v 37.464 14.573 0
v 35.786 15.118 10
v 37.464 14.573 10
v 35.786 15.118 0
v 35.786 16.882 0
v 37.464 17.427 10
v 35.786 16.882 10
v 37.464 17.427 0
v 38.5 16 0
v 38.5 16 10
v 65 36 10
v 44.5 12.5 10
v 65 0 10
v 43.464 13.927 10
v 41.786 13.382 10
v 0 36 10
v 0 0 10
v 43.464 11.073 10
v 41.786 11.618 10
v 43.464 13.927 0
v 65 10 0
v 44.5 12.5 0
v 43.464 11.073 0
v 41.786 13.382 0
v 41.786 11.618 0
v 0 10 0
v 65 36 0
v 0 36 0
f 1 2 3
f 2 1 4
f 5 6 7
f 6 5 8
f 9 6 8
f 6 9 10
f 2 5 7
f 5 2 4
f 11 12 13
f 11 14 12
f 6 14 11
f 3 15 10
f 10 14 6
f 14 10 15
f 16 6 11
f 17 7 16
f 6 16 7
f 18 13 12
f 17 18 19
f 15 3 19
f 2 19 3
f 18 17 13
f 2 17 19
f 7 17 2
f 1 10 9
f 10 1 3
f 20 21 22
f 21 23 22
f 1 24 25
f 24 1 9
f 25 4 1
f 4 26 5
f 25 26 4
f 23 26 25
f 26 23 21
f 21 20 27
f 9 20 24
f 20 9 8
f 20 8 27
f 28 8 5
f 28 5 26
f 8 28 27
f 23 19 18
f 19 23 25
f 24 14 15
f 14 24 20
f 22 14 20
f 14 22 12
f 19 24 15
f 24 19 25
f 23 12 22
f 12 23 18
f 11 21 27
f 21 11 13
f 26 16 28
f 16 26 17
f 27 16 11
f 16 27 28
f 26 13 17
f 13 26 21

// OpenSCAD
WW=65;
HH=36;
ZZ=10;
module wedge() {
    hull() {
    polyhedron([[0,0,0],[0,ZZ,0],[0,0,ZZ]],[[0,1,2]]);
    translate([WW,0,0])     polyhedron([[0,0,0],[0,ZZ,0],[0,0,ZZ]],[[0,1,2]]);
    }
}

module holes() {
    HX=37;
    HY=16;
    translate([HX,HY,0]) cylinder(ZZ,d=3);
    translate([HX+6,HY-3.5,0]) cylinder(ZZ,d=3);
}

module main() {
    difference() {
        cube([WW,HH,ZZ]);
        #wedge();
        #holes();
    }
}



main();
